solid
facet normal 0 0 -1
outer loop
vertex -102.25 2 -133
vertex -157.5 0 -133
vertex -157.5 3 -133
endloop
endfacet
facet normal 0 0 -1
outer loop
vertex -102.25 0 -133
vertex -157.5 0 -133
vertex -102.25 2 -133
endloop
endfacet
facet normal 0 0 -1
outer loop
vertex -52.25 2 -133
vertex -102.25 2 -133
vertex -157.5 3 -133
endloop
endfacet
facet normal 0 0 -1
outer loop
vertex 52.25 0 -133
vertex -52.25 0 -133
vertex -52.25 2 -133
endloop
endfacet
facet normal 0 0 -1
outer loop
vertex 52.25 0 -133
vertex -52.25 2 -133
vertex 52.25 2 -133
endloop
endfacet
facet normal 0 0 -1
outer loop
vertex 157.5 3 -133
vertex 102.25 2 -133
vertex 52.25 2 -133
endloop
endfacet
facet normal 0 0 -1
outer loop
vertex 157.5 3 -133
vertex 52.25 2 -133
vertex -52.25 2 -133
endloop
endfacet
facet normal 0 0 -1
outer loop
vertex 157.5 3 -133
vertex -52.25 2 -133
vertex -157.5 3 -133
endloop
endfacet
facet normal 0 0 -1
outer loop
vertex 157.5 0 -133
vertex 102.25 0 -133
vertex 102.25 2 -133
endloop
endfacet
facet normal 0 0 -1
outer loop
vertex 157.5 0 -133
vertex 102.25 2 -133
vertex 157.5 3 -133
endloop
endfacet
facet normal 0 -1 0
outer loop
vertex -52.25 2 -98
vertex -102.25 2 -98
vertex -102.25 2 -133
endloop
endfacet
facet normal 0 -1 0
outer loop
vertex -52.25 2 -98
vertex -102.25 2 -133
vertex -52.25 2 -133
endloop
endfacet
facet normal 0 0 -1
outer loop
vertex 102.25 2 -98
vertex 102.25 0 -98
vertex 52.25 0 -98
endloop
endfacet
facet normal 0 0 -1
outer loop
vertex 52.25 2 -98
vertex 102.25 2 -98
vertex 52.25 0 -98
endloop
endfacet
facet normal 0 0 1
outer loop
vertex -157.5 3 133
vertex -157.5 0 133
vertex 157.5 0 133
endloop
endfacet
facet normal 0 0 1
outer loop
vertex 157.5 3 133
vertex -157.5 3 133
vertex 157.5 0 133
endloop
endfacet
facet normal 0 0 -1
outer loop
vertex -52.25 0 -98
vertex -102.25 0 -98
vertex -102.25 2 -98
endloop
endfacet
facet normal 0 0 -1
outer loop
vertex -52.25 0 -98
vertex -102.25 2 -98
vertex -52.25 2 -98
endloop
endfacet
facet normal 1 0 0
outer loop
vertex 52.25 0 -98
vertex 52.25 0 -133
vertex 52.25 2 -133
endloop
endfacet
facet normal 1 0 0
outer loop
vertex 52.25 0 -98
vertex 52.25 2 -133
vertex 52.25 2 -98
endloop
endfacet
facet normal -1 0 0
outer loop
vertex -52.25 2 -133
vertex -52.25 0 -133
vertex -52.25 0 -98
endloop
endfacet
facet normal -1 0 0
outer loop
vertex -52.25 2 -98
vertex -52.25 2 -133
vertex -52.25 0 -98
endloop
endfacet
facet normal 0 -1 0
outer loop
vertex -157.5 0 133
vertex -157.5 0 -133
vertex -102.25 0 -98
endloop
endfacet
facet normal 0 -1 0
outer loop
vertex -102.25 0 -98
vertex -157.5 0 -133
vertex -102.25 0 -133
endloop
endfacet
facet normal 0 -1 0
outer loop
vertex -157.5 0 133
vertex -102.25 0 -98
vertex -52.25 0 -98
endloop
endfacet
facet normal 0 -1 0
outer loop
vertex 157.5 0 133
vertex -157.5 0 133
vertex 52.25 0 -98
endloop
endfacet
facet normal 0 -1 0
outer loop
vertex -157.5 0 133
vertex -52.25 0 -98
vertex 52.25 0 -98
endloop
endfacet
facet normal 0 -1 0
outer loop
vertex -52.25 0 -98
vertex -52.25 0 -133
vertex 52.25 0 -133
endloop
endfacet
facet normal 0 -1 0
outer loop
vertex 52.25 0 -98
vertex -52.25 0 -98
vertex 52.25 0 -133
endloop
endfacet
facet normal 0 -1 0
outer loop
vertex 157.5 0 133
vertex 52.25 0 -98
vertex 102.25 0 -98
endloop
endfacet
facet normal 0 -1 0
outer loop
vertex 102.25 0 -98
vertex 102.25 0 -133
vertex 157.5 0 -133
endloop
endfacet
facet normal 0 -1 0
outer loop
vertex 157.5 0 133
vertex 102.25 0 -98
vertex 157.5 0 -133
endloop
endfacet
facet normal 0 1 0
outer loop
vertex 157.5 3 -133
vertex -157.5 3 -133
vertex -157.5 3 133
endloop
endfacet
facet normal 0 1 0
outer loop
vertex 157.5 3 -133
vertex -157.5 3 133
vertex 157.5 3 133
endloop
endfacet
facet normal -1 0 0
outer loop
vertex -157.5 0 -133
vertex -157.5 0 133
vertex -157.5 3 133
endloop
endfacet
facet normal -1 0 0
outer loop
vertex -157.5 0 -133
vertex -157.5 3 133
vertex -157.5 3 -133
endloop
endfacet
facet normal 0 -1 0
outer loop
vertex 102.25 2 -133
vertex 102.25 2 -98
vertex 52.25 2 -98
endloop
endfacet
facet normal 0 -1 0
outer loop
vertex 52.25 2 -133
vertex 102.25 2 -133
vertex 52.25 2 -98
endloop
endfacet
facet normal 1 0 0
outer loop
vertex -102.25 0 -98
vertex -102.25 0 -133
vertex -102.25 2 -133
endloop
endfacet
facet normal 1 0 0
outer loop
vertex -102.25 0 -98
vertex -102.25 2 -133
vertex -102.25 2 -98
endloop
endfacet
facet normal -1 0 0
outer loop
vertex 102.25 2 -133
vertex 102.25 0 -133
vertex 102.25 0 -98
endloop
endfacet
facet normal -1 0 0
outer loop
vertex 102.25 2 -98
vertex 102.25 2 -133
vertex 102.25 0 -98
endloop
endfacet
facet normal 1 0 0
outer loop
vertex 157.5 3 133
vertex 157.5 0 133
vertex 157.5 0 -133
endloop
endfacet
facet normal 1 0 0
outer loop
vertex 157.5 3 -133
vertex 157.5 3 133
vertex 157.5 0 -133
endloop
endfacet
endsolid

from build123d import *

# Parameters (mm, degrees)
SKETCH1_W           = 315
SKETCH1_H           = 266
BOSS_EXTRUDE1_DEPTH = 3
SKETCH2_W           = 50
SKETCH2_H           = 35
CUT_EXTRUDE1_DEPTH  = 2


with BuildPart() as part:
    # Sketch1 → Boss-Extrude1 (new body)
    with BuildSketch(Plane(origin=(0, 0, 0), x_dir=(1, 0, 0), z_dir=(0, 1, 0))):
        Rectangle(SKETCH1_W, SKETCH1_H)
    extrude(amount=BOSS_EXTRUDE1_DEPTH)

    # Sketch2 → Cut-Extrude1 (cut)
    with BuildSketch(Plane.XZ):
        with Locations((-77.25, -115.5)):
            Rectangle(SKETCH2_W, SKETCH2_H)
    cut_extrude1 = extrude(amount=-CUT_EXTRUDE1_DEPTH, mode=Mode.SUBTRACT)

    # Mirror1: Cut-Extrude1 across plane
    add(cut_extrude1.mirror(Plane(origin=(0, 0, 0), x_dir=(0, 0, 1), z_dir=(1, 0, 0))), mode=Mode.SUBTRACT)


solid = part.part
